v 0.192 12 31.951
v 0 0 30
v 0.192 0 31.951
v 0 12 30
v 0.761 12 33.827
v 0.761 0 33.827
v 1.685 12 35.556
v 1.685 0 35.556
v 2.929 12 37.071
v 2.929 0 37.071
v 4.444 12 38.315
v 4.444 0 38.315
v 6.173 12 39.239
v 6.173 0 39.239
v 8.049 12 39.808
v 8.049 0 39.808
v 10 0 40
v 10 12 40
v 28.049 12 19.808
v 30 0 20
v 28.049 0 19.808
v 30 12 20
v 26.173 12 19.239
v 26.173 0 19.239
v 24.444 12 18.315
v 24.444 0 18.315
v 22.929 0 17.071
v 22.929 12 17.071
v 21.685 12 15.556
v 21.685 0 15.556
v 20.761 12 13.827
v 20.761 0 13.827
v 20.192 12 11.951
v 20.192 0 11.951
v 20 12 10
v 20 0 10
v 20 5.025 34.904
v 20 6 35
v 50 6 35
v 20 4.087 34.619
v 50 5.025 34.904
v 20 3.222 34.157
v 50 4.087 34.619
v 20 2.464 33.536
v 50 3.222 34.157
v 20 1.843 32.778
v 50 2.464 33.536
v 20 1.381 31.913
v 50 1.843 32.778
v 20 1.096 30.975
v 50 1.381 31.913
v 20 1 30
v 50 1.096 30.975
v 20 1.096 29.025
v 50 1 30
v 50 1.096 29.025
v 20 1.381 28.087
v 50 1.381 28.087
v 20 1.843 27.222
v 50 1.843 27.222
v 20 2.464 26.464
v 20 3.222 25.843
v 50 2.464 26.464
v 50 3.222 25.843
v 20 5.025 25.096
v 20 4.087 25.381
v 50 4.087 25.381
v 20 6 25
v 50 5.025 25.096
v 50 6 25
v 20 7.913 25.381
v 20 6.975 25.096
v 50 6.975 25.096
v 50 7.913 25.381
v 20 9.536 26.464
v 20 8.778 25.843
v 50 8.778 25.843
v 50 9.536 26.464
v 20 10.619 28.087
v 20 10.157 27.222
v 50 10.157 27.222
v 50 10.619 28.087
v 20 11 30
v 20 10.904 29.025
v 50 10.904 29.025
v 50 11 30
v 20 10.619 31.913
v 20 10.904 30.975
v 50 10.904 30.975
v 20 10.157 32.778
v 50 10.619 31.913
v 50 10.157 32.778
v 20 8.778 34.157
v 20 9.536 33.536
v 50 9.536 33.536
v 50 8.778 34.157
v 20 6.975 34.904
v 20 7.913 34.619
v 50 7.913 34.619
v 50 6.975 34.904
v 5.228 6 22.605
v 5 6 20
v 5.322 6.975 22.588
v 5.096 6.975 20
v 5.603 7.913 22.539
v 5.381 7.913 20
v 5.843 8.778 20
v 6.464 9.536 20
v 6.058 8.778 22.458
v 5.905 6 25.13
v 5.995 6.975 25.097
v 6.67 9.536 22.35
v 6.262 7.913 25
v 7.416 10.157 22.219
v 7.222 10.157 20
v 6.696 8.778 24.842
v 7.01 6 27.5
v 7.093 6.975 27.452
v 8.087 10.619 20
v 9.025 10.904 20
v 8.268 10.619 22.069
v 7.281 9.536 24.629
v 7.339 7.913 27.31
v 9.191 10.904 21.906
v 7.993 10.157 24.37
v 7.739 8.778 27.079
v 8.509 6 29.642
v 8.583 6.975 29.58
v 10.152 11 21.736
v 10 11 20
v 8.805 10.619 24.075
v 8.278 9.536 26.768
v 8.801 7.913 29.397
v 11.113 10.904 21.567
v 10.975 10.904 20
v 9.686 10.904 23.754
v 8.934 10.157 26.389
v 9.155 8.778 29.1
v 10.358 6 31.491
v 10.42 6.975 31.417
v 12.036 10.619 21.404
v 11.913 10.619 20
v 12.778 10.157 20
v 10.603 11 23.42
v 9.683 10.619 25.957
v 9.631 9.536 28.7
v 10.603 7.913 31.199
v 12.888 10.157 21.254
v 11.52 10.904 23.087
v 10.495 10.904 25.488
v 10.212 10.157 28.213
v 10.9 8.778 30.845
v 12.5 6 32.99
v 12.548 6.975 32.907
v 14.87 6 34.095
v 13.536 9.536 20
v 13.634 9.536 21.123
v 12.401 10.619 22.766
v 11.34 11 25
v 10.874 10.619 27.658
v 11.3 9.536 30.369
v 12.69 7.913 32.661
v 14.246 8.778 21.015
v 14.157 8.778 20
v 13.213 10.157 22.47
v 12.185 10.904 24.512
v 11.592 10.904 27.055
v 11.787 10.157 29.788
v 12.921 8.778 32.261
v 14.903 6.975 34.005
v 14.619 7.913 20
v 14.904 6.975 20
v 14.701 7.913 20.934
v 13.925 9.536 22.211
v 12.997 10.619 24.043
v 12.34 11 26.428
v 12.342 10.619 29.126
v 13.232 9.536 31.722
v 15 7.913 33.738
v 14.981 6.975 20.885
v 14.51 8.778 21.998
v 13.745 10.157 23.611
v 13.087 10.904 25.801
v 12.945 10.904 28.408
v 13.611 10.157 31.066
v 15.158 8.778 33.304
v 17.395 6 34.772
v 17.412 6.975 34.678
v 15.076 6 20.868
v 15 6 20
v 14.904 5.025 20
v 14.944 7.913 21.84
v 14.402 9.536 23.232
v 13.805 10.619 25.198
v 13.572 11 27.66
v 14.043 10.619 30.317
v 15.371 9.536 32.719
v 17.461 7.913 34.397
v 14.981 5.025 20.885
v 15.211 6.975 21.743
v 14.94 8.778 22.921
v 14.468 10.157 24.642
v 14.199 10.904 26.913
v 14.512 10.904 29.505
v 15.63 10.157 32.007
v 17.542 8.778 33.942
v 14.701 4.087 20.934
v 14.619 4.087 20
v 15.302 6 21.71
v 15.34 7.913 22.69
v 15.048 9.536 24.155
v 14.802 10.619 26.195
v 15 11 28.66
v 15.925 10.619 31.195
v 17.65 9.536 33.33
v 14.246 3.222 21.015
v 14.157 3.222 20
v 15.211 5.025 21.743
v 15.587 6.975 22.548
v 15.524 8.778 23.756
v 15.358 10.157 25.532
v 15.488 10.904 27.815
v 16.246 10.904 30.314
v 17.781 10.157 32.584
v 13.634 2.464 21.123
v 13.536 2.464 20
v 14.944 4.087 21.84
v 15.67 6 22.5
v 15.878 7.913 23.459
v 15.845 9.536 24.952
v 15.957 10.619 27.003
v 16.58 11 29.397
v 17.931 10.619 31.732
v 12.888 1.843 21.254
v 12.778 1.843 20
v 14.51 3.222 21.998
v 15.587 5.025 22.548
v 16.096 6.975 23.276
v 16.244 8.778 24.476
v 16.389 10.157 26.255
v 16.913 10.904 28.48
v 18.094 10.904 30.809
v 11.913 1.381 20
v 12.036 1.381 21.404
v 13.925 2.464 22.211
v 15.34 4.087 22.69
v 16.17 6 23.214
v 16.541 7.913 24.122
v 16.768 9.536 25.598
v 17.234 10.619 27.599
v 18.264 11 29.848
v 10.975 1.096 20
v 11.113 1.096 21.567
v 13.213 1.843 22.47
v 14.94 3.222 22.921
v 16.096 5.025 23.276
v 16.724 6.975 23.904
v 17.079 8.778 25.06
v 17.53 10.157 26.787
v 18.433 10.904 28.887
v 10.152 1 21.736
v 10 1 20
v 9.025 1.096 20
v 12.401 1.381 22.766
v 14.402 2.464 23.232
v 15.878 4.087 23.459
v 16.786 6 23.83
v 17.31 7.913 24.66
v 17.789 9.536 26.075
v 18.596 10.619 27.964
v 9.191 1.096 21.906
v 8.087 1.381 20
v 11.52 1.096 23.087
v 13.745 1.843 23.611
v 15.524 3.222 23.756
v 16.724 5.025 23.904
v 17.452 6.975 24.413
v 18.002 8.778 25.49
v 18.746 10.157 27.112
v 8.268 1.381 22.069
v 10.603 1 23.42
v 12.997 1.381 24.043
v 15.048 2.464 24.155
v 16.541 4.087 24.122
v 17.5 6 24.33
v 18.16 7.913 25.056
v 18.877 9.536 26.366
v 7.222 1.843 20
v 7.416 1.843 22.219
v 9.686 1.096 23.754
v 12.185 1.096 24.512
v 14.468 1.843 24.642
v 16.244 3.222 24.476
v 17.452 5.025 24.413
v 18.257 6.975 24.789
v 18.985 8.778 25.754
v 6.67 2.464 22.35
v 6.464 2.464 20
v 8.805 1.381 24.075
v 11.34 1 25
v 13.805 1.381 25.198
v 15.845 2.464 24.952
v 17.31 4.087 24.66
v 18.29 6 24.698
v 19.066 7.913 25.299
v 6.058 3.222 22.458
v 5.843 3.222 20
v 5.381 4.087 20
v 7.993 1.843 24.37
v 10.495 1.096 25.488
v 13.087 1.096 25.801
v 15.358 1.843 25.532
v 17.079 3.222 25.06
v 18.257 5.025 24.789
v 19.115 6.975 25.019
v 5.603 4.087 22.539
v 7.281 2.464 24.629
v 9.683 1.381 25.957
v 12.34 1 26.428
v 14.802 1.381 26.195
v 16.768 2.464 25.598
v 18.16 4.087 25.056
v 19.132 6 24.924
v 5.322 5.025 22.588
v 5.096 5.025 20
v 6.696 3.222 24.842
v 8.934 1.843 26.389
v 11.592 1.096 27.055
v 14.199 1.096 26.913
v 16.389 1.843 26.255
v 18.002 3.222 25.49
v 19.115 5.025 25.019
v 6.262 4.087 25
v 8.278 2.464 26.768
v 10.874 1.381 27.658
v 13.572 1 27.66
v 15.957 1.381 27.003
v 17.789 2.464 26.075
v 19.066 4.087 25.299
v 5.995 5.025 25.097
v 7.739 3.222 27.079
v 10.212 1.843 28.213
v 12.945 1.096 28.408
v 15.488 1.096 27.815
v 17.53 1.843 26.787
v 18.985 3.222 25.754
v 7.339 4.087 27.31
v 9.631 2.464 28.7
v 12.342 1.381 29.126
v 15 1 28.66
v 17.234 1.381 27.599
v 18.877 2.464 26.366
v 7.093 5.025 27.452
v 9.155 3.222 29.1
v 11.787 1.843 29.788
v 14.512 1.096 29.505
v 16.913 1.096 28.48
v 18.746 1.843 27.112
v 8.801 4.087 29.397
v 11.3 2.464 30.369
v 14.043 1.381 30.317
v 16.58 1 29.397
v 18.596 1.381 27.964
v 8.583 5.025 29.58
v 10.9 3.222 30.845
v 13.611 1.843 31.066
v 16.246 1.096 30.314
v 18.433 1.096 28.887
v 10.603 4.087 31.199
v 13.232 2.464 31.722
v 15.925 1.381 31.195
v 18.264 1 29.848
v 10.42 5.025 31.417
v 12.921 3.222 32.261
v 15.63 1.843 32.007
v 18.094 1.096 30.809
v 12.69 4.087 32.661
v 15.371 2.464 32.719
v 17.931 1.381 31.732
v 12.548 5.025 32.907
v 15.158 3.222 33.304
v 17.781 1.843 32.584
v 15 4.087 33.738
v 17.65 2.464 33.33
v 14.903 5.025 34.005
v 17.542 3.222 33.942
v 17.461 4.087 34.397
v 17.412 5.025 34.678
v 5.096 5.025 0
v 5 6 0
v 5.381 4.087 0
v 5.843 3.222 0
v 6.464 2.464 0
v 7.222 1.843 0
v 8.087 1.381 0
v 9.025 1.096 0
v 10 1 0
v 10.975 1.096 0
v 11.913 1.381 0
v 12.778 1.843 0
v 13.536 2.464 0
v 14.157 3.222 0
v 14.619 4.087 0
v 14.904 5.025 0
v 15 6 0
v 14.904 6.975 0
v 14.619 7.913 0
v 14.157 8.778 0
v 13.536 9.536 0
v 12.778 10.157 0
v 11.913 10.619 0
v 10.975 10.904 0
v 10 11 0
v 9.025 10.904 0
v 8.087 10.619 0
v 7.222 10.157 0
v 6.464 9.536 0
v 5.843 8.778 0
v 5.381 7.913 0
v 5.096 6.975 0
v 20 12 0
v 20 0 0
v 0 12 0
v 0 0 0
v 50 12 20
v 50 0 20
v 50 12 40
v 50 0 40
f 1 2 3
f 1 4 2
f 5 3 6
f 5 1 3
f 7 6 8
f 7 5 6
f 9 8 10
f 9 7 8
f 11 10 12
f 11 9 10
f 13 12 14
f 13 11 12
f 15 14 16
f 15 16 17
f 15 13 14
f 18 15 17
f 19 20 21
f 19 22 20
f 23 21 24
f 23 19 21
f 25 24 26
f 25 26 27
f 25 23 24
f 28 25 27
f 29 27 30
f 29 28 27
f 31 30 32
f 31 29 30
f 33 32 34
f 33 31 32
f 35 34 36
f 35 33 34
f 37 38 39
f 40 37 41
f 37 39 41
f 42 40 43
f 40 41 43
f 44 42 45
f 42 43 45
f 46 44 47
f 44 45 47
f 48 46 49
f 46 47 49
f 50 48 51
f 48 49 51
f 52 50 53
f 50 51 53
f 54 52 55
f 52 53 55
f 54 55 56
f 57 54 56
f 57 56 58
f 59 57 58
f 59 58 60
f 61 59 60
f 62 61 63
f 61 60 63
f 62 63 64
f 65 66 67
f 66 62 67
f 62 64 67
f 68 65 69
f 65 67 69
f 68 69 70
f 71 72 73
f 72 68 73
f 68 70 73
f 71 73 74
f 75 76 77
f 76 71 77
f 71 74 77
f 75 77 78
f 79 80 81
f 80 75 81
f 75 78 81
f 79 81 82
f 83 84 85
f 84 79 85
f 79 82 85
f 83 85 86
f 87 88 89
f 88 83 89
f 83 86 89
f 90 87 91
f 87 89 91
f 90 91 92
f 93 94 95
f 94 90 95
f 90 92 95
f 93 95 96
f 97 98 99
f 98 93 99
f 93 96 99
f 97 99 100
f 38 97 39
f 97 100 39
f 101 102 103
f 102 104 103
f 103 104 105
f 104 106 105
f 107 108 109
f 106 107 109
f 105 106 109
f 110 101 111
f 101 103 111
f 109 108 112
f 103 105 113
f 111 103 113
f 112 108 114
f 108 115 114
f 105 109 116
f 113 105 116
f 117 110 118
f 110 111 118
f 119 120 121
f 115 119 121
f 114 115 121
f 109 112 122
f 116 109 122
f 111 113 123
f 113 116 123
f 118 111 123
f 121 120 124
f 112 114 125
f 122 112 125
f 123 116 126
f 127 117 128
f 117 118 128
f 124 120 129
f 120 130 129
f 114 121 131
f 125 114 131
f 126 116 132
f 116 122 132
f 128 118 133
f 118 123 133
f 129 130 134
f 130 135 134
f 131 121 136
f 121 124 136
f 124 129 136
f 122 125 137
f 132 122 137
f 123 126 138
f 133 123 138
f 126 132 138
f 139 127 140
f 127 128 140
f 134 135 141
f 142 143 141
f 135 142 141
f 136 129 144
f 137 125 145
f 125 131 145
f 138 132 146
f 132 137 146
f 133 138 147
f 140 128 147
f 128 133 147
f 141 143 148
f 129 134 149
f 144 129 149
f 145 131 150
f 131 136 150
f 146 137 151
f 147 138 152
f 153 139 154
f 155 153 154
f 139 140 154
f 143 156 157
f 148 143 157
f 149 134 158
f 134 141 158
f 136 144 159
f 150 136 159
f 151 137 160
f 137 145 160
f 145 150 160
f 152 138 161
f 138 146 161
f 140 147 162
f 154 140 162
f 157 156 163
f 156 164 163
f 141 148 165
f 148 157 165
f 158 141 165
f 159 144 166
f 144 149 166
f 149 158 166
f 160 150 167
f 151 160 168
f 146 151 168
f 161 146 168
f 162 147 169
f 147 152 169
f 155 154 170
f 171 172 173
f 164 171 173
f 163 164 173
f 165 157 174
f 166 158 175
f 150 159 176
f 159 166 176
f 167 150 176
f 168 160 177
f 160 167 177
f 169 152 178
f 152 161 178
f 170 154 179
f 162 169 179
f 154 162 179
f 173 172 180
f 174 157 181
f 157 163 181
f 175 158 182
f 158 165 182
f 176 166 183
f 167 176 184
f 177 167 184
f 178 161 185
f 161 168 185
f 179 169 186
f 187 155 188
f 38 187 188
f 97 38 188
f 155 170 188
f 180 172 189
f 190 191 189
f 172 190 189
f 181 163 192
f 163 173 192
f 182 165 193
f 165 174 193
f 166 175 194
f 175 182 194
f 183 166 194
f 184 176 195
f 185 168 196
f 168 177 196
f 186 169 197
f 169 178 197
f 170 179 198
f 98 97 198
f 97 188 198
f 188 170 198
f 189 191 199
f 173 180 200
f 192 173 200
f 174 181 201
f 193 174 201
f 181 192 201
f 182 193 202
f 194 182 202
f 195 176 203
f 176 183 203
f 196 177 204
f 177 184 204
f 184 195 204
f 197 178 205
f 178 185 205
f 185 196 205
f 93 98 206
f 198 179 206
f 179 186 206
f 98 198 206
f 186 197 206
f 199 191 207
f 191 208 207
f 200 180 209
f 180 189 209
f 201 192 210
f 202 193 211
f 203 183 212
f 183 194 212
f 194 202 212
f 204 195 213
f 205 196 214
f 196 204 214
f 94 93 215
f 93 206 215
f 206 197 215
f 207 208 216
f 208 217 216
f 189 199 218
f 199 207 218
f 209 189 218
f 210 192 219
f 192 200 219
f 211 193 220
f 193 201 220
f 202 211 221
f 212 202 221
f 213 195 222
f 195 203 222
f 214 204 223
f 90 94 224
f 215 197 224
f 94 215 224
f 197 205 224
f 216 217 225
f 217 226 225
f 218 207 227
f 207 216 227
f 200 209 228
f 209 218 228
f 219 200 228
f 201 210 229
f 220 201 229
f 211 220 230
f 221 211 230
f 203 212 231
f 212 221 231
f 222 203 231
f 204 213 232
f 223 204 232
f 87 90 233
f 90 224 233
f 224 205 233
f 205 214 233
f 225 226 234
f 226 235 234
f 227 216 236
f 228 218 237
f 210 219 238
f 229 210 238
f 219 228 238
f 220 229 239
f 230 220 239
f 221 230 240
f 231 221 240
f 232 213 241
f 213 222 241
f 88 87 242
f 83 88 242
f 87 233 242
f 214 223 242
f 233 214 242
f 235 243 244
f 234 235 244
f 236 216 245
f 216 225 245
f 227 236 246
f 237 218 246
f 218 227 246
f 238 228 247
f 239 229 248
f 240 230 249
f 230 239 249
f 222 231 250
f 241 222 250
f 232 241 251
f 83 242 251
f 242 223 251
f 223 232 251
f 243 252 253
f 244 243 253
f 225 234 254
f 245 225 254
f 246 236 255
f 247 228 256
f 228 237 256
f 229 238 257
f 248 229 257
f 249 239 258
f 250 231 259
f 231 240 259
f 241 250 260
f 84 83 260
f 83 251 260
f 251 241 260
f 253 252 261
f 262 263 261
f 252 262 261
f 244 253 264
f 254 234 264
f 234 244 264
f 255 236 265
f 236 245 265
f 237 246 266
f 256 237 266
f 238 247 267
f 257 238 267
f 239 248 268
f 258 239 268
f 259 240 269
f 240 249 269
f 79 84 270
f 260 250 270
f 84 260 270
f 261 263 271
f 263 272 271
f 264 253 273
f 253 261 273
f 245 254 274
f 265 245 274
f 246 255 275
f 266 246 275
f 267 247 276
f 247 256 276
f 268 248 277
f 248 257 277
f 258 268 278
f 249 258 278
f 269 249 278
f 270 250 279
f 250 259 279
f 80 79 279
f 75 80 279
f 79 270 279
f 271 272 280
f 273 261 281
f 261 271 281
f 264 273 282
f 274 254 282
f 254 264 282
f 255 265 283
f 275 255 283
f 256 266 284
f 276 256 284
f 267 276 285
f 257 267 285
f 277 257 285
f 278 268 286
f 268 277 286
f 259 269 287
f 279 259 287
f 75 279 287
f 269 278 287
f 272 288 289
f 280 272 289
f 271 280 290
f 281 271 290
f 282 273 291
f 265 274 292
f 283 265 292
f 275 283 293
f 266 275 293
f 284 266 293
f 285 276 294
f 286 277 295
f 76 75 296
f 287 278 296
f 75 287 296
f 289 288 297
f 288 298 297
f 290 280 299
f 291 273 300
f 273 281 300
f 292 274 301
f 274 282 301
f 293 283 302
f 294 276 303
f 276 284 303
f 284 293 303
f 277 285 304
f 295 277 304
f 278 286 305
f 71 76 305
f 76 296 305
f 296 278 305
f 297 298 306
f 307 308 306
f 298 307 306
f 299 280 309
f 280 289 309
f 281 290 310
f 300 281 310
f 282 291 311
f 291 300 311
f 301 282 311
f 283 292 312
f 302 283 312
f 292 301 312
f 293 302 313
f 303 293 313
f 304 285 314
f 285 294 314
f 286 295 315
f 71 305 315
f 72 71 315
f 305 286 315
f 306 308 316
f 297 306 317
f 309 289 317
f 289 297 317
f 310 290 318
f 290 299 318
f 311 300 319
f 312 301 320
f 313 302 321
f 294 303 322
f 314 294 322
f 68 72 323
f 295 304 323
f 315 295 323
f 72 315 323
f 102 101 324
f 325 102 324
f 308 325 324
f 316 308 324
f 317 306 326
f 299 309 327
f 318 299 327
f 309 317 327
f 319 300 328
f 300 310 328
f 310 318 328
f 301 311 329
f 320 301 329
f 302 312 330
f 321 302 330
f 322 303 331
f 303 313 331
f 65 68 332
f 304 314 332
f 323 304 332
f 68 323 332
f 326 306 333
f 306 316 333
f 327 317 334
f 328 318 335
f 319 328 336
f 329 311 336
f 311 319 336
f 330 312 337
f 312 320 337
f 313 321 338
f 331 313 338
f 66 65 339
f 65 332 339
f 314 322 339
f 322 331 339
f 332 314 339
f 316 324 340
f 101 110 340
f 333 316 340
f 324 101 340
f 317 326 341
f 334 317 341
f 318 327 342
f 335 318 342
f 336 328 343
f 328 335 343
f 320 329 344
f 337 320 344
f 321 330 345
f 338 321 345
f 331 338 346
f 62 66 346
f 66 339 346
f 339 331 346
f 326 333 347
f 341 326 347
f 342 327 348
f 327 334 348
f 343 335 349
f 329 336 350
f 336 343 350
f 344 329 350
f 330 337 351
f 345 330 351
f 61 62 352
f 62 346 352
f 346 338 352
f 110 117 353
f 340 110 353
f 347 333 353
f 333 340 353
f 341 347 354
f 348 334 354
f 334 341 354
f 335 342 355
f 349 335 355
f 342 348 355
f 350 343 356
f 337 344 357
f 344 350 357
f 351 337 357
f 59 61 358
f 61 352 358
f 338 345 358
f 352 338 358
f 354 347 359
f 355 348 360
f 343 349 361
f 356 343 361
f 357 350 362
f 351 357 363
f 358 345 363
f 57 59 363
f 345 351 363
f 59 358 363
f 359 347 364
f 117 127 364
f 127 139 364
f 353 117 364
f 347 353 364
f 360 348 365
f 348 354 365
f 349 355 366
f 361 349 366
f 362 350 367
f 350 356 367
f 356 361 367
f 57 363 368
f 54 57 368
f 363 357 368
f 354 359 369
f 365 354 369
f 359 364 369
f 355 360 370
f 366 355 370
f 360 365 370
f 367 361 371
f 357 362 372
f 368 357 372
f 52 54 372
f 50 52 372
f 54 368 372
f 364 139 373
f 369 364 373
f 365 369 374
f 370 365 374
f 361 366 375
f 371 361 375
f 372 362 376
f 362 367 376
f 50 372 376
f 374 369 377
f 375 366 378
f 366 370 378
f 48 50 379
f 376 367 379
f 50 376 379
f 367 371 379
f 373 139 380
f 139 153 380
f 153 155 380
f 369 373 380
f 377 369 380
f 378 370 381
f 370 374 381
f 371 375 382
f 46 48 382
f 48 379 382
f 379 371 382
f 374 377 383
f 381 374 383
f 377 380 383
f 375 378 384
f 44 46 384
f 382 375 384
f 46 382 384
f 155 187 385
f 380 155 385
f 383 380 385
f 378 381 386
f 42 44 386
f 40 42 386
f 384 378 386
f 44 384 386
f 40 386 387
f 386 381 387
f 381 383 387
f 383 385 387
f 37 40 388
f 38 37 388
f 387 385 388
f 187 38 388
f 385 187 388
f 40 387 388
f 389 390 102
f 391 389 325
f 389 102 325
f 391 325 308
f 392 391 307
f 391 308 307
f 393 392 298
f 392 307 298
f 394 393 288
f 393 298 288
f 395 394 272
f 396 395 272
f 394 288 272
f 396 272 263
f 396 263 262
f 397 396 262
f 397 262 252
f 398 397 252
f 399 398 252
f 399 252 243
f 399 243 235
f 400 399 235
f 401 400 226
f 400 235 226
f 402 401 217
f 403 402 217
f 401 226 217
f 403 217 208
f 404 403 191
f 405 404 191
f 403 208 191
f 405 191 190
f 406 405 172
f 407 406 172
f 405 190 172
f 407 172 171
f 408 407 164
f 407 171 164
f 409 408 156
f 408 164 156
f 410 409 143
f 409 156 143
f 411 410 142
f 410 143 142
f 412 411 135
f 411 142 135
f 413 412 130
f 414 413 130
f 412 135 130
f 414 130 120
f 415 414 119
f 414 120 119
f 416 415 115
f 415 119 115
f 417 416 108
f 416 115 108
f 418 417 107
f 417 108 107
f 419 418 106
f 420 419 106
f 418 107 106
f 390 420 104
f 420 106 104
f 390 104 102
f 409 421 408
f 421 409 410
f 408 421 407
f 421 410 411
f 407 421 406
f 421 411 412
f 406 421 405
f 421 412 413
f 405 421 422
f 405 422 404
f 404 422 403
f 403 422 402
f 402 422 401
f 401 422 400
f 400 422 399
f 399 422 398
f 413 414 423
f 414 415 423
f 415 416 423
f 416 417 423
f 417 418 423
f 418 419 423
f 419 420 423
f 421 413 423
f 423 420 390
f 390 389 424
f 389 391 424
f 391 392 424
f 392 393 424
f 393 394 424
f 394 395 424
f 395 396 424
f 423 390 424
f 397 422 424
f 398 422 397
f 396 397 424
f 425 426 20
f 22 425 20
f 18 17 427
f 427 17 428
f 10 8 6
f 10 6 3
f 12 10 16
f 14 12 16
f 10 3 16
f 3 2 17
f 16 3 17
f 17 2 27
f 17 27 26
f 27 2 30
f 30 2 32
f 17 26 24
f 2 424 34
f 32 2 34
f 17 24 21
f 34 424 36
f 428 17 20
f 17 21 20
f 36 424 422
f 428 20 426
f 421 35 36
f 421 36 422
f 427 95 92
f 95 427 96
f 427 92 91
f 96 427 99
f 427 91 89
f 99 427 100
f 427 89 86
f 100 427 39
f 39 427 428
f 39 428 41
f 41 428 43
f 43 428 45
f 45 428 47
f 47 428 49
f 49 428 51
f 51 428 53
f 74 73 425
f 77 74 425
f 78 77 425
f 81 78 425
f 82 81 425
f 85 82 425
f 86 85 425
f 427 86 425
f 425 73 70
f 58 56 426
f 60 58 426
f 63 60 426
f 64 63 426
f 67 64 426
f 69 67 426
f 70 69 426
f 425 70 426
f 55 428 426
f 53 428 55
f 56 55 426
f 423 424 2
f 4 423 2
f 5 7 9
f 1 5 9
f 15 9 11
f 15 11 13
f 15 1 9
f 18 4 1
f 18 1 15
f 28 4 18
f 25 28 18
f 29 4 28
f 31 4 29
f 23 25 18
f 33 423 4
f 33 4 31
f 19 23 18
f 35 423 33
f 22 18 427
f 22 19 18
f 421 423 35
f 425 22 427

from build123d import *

# Parameters (mm, degrees)
EXTRUDE_1_DEPTH = 12
FILLET_2_R      = 10
SKETCH_2_R      = 5


with BuildPart() as part:
    # 草图1 → 凸台-拉伸1 (new body)
    with BuildSketch(Plane(origin=(0, 0, 0), x_dir=(1, 0, 0), z_dir=(0, 1, 0))):
        Polygon((0, 0), (0, -40), (50, -40), (50, -20), (20, -20), (20, 0), align=None)
    extrude(amount=EXTRUDE_1_DEPTH)

    # 圆角2
    fillet_2_edges = [part.edges().sort_by_distance(p)[0] for p in [
        (20, 6, 20),
        (0, 6, 40),
    ]]
    fillet(fillet_2_edges, radius=FILLET_2_R)

    # 切除-扫描1: sweep along a path in 草图4
    with BuildLine(Plane(origin=(0, 6, 0), x_dir=(-1, 0, 0), z_dir=(0, -1, 0))) as sweep_1_path:
        Line((-10, 3.270515342), (-10, -20))
        ThreePointArc((-10, -20), (-12.928932188, -27.071067812), (-20, -30))
        Line((-20, -30), (-53.042337367, -30))
    # 草图2 → 切除-扫描1 (sweep, cut)
    with BuildSketch(Plane(origin=(0, 0, 0), x_dir=(-1, 0, 0), z_dir=(0, 0, -1))):
        with Locations((-10, 6)):
            Circle(SKETCH_2_R)
    sweep(path=sweep_1_path.line, mode=Mode.SUBTRACT)


solid = part.part
